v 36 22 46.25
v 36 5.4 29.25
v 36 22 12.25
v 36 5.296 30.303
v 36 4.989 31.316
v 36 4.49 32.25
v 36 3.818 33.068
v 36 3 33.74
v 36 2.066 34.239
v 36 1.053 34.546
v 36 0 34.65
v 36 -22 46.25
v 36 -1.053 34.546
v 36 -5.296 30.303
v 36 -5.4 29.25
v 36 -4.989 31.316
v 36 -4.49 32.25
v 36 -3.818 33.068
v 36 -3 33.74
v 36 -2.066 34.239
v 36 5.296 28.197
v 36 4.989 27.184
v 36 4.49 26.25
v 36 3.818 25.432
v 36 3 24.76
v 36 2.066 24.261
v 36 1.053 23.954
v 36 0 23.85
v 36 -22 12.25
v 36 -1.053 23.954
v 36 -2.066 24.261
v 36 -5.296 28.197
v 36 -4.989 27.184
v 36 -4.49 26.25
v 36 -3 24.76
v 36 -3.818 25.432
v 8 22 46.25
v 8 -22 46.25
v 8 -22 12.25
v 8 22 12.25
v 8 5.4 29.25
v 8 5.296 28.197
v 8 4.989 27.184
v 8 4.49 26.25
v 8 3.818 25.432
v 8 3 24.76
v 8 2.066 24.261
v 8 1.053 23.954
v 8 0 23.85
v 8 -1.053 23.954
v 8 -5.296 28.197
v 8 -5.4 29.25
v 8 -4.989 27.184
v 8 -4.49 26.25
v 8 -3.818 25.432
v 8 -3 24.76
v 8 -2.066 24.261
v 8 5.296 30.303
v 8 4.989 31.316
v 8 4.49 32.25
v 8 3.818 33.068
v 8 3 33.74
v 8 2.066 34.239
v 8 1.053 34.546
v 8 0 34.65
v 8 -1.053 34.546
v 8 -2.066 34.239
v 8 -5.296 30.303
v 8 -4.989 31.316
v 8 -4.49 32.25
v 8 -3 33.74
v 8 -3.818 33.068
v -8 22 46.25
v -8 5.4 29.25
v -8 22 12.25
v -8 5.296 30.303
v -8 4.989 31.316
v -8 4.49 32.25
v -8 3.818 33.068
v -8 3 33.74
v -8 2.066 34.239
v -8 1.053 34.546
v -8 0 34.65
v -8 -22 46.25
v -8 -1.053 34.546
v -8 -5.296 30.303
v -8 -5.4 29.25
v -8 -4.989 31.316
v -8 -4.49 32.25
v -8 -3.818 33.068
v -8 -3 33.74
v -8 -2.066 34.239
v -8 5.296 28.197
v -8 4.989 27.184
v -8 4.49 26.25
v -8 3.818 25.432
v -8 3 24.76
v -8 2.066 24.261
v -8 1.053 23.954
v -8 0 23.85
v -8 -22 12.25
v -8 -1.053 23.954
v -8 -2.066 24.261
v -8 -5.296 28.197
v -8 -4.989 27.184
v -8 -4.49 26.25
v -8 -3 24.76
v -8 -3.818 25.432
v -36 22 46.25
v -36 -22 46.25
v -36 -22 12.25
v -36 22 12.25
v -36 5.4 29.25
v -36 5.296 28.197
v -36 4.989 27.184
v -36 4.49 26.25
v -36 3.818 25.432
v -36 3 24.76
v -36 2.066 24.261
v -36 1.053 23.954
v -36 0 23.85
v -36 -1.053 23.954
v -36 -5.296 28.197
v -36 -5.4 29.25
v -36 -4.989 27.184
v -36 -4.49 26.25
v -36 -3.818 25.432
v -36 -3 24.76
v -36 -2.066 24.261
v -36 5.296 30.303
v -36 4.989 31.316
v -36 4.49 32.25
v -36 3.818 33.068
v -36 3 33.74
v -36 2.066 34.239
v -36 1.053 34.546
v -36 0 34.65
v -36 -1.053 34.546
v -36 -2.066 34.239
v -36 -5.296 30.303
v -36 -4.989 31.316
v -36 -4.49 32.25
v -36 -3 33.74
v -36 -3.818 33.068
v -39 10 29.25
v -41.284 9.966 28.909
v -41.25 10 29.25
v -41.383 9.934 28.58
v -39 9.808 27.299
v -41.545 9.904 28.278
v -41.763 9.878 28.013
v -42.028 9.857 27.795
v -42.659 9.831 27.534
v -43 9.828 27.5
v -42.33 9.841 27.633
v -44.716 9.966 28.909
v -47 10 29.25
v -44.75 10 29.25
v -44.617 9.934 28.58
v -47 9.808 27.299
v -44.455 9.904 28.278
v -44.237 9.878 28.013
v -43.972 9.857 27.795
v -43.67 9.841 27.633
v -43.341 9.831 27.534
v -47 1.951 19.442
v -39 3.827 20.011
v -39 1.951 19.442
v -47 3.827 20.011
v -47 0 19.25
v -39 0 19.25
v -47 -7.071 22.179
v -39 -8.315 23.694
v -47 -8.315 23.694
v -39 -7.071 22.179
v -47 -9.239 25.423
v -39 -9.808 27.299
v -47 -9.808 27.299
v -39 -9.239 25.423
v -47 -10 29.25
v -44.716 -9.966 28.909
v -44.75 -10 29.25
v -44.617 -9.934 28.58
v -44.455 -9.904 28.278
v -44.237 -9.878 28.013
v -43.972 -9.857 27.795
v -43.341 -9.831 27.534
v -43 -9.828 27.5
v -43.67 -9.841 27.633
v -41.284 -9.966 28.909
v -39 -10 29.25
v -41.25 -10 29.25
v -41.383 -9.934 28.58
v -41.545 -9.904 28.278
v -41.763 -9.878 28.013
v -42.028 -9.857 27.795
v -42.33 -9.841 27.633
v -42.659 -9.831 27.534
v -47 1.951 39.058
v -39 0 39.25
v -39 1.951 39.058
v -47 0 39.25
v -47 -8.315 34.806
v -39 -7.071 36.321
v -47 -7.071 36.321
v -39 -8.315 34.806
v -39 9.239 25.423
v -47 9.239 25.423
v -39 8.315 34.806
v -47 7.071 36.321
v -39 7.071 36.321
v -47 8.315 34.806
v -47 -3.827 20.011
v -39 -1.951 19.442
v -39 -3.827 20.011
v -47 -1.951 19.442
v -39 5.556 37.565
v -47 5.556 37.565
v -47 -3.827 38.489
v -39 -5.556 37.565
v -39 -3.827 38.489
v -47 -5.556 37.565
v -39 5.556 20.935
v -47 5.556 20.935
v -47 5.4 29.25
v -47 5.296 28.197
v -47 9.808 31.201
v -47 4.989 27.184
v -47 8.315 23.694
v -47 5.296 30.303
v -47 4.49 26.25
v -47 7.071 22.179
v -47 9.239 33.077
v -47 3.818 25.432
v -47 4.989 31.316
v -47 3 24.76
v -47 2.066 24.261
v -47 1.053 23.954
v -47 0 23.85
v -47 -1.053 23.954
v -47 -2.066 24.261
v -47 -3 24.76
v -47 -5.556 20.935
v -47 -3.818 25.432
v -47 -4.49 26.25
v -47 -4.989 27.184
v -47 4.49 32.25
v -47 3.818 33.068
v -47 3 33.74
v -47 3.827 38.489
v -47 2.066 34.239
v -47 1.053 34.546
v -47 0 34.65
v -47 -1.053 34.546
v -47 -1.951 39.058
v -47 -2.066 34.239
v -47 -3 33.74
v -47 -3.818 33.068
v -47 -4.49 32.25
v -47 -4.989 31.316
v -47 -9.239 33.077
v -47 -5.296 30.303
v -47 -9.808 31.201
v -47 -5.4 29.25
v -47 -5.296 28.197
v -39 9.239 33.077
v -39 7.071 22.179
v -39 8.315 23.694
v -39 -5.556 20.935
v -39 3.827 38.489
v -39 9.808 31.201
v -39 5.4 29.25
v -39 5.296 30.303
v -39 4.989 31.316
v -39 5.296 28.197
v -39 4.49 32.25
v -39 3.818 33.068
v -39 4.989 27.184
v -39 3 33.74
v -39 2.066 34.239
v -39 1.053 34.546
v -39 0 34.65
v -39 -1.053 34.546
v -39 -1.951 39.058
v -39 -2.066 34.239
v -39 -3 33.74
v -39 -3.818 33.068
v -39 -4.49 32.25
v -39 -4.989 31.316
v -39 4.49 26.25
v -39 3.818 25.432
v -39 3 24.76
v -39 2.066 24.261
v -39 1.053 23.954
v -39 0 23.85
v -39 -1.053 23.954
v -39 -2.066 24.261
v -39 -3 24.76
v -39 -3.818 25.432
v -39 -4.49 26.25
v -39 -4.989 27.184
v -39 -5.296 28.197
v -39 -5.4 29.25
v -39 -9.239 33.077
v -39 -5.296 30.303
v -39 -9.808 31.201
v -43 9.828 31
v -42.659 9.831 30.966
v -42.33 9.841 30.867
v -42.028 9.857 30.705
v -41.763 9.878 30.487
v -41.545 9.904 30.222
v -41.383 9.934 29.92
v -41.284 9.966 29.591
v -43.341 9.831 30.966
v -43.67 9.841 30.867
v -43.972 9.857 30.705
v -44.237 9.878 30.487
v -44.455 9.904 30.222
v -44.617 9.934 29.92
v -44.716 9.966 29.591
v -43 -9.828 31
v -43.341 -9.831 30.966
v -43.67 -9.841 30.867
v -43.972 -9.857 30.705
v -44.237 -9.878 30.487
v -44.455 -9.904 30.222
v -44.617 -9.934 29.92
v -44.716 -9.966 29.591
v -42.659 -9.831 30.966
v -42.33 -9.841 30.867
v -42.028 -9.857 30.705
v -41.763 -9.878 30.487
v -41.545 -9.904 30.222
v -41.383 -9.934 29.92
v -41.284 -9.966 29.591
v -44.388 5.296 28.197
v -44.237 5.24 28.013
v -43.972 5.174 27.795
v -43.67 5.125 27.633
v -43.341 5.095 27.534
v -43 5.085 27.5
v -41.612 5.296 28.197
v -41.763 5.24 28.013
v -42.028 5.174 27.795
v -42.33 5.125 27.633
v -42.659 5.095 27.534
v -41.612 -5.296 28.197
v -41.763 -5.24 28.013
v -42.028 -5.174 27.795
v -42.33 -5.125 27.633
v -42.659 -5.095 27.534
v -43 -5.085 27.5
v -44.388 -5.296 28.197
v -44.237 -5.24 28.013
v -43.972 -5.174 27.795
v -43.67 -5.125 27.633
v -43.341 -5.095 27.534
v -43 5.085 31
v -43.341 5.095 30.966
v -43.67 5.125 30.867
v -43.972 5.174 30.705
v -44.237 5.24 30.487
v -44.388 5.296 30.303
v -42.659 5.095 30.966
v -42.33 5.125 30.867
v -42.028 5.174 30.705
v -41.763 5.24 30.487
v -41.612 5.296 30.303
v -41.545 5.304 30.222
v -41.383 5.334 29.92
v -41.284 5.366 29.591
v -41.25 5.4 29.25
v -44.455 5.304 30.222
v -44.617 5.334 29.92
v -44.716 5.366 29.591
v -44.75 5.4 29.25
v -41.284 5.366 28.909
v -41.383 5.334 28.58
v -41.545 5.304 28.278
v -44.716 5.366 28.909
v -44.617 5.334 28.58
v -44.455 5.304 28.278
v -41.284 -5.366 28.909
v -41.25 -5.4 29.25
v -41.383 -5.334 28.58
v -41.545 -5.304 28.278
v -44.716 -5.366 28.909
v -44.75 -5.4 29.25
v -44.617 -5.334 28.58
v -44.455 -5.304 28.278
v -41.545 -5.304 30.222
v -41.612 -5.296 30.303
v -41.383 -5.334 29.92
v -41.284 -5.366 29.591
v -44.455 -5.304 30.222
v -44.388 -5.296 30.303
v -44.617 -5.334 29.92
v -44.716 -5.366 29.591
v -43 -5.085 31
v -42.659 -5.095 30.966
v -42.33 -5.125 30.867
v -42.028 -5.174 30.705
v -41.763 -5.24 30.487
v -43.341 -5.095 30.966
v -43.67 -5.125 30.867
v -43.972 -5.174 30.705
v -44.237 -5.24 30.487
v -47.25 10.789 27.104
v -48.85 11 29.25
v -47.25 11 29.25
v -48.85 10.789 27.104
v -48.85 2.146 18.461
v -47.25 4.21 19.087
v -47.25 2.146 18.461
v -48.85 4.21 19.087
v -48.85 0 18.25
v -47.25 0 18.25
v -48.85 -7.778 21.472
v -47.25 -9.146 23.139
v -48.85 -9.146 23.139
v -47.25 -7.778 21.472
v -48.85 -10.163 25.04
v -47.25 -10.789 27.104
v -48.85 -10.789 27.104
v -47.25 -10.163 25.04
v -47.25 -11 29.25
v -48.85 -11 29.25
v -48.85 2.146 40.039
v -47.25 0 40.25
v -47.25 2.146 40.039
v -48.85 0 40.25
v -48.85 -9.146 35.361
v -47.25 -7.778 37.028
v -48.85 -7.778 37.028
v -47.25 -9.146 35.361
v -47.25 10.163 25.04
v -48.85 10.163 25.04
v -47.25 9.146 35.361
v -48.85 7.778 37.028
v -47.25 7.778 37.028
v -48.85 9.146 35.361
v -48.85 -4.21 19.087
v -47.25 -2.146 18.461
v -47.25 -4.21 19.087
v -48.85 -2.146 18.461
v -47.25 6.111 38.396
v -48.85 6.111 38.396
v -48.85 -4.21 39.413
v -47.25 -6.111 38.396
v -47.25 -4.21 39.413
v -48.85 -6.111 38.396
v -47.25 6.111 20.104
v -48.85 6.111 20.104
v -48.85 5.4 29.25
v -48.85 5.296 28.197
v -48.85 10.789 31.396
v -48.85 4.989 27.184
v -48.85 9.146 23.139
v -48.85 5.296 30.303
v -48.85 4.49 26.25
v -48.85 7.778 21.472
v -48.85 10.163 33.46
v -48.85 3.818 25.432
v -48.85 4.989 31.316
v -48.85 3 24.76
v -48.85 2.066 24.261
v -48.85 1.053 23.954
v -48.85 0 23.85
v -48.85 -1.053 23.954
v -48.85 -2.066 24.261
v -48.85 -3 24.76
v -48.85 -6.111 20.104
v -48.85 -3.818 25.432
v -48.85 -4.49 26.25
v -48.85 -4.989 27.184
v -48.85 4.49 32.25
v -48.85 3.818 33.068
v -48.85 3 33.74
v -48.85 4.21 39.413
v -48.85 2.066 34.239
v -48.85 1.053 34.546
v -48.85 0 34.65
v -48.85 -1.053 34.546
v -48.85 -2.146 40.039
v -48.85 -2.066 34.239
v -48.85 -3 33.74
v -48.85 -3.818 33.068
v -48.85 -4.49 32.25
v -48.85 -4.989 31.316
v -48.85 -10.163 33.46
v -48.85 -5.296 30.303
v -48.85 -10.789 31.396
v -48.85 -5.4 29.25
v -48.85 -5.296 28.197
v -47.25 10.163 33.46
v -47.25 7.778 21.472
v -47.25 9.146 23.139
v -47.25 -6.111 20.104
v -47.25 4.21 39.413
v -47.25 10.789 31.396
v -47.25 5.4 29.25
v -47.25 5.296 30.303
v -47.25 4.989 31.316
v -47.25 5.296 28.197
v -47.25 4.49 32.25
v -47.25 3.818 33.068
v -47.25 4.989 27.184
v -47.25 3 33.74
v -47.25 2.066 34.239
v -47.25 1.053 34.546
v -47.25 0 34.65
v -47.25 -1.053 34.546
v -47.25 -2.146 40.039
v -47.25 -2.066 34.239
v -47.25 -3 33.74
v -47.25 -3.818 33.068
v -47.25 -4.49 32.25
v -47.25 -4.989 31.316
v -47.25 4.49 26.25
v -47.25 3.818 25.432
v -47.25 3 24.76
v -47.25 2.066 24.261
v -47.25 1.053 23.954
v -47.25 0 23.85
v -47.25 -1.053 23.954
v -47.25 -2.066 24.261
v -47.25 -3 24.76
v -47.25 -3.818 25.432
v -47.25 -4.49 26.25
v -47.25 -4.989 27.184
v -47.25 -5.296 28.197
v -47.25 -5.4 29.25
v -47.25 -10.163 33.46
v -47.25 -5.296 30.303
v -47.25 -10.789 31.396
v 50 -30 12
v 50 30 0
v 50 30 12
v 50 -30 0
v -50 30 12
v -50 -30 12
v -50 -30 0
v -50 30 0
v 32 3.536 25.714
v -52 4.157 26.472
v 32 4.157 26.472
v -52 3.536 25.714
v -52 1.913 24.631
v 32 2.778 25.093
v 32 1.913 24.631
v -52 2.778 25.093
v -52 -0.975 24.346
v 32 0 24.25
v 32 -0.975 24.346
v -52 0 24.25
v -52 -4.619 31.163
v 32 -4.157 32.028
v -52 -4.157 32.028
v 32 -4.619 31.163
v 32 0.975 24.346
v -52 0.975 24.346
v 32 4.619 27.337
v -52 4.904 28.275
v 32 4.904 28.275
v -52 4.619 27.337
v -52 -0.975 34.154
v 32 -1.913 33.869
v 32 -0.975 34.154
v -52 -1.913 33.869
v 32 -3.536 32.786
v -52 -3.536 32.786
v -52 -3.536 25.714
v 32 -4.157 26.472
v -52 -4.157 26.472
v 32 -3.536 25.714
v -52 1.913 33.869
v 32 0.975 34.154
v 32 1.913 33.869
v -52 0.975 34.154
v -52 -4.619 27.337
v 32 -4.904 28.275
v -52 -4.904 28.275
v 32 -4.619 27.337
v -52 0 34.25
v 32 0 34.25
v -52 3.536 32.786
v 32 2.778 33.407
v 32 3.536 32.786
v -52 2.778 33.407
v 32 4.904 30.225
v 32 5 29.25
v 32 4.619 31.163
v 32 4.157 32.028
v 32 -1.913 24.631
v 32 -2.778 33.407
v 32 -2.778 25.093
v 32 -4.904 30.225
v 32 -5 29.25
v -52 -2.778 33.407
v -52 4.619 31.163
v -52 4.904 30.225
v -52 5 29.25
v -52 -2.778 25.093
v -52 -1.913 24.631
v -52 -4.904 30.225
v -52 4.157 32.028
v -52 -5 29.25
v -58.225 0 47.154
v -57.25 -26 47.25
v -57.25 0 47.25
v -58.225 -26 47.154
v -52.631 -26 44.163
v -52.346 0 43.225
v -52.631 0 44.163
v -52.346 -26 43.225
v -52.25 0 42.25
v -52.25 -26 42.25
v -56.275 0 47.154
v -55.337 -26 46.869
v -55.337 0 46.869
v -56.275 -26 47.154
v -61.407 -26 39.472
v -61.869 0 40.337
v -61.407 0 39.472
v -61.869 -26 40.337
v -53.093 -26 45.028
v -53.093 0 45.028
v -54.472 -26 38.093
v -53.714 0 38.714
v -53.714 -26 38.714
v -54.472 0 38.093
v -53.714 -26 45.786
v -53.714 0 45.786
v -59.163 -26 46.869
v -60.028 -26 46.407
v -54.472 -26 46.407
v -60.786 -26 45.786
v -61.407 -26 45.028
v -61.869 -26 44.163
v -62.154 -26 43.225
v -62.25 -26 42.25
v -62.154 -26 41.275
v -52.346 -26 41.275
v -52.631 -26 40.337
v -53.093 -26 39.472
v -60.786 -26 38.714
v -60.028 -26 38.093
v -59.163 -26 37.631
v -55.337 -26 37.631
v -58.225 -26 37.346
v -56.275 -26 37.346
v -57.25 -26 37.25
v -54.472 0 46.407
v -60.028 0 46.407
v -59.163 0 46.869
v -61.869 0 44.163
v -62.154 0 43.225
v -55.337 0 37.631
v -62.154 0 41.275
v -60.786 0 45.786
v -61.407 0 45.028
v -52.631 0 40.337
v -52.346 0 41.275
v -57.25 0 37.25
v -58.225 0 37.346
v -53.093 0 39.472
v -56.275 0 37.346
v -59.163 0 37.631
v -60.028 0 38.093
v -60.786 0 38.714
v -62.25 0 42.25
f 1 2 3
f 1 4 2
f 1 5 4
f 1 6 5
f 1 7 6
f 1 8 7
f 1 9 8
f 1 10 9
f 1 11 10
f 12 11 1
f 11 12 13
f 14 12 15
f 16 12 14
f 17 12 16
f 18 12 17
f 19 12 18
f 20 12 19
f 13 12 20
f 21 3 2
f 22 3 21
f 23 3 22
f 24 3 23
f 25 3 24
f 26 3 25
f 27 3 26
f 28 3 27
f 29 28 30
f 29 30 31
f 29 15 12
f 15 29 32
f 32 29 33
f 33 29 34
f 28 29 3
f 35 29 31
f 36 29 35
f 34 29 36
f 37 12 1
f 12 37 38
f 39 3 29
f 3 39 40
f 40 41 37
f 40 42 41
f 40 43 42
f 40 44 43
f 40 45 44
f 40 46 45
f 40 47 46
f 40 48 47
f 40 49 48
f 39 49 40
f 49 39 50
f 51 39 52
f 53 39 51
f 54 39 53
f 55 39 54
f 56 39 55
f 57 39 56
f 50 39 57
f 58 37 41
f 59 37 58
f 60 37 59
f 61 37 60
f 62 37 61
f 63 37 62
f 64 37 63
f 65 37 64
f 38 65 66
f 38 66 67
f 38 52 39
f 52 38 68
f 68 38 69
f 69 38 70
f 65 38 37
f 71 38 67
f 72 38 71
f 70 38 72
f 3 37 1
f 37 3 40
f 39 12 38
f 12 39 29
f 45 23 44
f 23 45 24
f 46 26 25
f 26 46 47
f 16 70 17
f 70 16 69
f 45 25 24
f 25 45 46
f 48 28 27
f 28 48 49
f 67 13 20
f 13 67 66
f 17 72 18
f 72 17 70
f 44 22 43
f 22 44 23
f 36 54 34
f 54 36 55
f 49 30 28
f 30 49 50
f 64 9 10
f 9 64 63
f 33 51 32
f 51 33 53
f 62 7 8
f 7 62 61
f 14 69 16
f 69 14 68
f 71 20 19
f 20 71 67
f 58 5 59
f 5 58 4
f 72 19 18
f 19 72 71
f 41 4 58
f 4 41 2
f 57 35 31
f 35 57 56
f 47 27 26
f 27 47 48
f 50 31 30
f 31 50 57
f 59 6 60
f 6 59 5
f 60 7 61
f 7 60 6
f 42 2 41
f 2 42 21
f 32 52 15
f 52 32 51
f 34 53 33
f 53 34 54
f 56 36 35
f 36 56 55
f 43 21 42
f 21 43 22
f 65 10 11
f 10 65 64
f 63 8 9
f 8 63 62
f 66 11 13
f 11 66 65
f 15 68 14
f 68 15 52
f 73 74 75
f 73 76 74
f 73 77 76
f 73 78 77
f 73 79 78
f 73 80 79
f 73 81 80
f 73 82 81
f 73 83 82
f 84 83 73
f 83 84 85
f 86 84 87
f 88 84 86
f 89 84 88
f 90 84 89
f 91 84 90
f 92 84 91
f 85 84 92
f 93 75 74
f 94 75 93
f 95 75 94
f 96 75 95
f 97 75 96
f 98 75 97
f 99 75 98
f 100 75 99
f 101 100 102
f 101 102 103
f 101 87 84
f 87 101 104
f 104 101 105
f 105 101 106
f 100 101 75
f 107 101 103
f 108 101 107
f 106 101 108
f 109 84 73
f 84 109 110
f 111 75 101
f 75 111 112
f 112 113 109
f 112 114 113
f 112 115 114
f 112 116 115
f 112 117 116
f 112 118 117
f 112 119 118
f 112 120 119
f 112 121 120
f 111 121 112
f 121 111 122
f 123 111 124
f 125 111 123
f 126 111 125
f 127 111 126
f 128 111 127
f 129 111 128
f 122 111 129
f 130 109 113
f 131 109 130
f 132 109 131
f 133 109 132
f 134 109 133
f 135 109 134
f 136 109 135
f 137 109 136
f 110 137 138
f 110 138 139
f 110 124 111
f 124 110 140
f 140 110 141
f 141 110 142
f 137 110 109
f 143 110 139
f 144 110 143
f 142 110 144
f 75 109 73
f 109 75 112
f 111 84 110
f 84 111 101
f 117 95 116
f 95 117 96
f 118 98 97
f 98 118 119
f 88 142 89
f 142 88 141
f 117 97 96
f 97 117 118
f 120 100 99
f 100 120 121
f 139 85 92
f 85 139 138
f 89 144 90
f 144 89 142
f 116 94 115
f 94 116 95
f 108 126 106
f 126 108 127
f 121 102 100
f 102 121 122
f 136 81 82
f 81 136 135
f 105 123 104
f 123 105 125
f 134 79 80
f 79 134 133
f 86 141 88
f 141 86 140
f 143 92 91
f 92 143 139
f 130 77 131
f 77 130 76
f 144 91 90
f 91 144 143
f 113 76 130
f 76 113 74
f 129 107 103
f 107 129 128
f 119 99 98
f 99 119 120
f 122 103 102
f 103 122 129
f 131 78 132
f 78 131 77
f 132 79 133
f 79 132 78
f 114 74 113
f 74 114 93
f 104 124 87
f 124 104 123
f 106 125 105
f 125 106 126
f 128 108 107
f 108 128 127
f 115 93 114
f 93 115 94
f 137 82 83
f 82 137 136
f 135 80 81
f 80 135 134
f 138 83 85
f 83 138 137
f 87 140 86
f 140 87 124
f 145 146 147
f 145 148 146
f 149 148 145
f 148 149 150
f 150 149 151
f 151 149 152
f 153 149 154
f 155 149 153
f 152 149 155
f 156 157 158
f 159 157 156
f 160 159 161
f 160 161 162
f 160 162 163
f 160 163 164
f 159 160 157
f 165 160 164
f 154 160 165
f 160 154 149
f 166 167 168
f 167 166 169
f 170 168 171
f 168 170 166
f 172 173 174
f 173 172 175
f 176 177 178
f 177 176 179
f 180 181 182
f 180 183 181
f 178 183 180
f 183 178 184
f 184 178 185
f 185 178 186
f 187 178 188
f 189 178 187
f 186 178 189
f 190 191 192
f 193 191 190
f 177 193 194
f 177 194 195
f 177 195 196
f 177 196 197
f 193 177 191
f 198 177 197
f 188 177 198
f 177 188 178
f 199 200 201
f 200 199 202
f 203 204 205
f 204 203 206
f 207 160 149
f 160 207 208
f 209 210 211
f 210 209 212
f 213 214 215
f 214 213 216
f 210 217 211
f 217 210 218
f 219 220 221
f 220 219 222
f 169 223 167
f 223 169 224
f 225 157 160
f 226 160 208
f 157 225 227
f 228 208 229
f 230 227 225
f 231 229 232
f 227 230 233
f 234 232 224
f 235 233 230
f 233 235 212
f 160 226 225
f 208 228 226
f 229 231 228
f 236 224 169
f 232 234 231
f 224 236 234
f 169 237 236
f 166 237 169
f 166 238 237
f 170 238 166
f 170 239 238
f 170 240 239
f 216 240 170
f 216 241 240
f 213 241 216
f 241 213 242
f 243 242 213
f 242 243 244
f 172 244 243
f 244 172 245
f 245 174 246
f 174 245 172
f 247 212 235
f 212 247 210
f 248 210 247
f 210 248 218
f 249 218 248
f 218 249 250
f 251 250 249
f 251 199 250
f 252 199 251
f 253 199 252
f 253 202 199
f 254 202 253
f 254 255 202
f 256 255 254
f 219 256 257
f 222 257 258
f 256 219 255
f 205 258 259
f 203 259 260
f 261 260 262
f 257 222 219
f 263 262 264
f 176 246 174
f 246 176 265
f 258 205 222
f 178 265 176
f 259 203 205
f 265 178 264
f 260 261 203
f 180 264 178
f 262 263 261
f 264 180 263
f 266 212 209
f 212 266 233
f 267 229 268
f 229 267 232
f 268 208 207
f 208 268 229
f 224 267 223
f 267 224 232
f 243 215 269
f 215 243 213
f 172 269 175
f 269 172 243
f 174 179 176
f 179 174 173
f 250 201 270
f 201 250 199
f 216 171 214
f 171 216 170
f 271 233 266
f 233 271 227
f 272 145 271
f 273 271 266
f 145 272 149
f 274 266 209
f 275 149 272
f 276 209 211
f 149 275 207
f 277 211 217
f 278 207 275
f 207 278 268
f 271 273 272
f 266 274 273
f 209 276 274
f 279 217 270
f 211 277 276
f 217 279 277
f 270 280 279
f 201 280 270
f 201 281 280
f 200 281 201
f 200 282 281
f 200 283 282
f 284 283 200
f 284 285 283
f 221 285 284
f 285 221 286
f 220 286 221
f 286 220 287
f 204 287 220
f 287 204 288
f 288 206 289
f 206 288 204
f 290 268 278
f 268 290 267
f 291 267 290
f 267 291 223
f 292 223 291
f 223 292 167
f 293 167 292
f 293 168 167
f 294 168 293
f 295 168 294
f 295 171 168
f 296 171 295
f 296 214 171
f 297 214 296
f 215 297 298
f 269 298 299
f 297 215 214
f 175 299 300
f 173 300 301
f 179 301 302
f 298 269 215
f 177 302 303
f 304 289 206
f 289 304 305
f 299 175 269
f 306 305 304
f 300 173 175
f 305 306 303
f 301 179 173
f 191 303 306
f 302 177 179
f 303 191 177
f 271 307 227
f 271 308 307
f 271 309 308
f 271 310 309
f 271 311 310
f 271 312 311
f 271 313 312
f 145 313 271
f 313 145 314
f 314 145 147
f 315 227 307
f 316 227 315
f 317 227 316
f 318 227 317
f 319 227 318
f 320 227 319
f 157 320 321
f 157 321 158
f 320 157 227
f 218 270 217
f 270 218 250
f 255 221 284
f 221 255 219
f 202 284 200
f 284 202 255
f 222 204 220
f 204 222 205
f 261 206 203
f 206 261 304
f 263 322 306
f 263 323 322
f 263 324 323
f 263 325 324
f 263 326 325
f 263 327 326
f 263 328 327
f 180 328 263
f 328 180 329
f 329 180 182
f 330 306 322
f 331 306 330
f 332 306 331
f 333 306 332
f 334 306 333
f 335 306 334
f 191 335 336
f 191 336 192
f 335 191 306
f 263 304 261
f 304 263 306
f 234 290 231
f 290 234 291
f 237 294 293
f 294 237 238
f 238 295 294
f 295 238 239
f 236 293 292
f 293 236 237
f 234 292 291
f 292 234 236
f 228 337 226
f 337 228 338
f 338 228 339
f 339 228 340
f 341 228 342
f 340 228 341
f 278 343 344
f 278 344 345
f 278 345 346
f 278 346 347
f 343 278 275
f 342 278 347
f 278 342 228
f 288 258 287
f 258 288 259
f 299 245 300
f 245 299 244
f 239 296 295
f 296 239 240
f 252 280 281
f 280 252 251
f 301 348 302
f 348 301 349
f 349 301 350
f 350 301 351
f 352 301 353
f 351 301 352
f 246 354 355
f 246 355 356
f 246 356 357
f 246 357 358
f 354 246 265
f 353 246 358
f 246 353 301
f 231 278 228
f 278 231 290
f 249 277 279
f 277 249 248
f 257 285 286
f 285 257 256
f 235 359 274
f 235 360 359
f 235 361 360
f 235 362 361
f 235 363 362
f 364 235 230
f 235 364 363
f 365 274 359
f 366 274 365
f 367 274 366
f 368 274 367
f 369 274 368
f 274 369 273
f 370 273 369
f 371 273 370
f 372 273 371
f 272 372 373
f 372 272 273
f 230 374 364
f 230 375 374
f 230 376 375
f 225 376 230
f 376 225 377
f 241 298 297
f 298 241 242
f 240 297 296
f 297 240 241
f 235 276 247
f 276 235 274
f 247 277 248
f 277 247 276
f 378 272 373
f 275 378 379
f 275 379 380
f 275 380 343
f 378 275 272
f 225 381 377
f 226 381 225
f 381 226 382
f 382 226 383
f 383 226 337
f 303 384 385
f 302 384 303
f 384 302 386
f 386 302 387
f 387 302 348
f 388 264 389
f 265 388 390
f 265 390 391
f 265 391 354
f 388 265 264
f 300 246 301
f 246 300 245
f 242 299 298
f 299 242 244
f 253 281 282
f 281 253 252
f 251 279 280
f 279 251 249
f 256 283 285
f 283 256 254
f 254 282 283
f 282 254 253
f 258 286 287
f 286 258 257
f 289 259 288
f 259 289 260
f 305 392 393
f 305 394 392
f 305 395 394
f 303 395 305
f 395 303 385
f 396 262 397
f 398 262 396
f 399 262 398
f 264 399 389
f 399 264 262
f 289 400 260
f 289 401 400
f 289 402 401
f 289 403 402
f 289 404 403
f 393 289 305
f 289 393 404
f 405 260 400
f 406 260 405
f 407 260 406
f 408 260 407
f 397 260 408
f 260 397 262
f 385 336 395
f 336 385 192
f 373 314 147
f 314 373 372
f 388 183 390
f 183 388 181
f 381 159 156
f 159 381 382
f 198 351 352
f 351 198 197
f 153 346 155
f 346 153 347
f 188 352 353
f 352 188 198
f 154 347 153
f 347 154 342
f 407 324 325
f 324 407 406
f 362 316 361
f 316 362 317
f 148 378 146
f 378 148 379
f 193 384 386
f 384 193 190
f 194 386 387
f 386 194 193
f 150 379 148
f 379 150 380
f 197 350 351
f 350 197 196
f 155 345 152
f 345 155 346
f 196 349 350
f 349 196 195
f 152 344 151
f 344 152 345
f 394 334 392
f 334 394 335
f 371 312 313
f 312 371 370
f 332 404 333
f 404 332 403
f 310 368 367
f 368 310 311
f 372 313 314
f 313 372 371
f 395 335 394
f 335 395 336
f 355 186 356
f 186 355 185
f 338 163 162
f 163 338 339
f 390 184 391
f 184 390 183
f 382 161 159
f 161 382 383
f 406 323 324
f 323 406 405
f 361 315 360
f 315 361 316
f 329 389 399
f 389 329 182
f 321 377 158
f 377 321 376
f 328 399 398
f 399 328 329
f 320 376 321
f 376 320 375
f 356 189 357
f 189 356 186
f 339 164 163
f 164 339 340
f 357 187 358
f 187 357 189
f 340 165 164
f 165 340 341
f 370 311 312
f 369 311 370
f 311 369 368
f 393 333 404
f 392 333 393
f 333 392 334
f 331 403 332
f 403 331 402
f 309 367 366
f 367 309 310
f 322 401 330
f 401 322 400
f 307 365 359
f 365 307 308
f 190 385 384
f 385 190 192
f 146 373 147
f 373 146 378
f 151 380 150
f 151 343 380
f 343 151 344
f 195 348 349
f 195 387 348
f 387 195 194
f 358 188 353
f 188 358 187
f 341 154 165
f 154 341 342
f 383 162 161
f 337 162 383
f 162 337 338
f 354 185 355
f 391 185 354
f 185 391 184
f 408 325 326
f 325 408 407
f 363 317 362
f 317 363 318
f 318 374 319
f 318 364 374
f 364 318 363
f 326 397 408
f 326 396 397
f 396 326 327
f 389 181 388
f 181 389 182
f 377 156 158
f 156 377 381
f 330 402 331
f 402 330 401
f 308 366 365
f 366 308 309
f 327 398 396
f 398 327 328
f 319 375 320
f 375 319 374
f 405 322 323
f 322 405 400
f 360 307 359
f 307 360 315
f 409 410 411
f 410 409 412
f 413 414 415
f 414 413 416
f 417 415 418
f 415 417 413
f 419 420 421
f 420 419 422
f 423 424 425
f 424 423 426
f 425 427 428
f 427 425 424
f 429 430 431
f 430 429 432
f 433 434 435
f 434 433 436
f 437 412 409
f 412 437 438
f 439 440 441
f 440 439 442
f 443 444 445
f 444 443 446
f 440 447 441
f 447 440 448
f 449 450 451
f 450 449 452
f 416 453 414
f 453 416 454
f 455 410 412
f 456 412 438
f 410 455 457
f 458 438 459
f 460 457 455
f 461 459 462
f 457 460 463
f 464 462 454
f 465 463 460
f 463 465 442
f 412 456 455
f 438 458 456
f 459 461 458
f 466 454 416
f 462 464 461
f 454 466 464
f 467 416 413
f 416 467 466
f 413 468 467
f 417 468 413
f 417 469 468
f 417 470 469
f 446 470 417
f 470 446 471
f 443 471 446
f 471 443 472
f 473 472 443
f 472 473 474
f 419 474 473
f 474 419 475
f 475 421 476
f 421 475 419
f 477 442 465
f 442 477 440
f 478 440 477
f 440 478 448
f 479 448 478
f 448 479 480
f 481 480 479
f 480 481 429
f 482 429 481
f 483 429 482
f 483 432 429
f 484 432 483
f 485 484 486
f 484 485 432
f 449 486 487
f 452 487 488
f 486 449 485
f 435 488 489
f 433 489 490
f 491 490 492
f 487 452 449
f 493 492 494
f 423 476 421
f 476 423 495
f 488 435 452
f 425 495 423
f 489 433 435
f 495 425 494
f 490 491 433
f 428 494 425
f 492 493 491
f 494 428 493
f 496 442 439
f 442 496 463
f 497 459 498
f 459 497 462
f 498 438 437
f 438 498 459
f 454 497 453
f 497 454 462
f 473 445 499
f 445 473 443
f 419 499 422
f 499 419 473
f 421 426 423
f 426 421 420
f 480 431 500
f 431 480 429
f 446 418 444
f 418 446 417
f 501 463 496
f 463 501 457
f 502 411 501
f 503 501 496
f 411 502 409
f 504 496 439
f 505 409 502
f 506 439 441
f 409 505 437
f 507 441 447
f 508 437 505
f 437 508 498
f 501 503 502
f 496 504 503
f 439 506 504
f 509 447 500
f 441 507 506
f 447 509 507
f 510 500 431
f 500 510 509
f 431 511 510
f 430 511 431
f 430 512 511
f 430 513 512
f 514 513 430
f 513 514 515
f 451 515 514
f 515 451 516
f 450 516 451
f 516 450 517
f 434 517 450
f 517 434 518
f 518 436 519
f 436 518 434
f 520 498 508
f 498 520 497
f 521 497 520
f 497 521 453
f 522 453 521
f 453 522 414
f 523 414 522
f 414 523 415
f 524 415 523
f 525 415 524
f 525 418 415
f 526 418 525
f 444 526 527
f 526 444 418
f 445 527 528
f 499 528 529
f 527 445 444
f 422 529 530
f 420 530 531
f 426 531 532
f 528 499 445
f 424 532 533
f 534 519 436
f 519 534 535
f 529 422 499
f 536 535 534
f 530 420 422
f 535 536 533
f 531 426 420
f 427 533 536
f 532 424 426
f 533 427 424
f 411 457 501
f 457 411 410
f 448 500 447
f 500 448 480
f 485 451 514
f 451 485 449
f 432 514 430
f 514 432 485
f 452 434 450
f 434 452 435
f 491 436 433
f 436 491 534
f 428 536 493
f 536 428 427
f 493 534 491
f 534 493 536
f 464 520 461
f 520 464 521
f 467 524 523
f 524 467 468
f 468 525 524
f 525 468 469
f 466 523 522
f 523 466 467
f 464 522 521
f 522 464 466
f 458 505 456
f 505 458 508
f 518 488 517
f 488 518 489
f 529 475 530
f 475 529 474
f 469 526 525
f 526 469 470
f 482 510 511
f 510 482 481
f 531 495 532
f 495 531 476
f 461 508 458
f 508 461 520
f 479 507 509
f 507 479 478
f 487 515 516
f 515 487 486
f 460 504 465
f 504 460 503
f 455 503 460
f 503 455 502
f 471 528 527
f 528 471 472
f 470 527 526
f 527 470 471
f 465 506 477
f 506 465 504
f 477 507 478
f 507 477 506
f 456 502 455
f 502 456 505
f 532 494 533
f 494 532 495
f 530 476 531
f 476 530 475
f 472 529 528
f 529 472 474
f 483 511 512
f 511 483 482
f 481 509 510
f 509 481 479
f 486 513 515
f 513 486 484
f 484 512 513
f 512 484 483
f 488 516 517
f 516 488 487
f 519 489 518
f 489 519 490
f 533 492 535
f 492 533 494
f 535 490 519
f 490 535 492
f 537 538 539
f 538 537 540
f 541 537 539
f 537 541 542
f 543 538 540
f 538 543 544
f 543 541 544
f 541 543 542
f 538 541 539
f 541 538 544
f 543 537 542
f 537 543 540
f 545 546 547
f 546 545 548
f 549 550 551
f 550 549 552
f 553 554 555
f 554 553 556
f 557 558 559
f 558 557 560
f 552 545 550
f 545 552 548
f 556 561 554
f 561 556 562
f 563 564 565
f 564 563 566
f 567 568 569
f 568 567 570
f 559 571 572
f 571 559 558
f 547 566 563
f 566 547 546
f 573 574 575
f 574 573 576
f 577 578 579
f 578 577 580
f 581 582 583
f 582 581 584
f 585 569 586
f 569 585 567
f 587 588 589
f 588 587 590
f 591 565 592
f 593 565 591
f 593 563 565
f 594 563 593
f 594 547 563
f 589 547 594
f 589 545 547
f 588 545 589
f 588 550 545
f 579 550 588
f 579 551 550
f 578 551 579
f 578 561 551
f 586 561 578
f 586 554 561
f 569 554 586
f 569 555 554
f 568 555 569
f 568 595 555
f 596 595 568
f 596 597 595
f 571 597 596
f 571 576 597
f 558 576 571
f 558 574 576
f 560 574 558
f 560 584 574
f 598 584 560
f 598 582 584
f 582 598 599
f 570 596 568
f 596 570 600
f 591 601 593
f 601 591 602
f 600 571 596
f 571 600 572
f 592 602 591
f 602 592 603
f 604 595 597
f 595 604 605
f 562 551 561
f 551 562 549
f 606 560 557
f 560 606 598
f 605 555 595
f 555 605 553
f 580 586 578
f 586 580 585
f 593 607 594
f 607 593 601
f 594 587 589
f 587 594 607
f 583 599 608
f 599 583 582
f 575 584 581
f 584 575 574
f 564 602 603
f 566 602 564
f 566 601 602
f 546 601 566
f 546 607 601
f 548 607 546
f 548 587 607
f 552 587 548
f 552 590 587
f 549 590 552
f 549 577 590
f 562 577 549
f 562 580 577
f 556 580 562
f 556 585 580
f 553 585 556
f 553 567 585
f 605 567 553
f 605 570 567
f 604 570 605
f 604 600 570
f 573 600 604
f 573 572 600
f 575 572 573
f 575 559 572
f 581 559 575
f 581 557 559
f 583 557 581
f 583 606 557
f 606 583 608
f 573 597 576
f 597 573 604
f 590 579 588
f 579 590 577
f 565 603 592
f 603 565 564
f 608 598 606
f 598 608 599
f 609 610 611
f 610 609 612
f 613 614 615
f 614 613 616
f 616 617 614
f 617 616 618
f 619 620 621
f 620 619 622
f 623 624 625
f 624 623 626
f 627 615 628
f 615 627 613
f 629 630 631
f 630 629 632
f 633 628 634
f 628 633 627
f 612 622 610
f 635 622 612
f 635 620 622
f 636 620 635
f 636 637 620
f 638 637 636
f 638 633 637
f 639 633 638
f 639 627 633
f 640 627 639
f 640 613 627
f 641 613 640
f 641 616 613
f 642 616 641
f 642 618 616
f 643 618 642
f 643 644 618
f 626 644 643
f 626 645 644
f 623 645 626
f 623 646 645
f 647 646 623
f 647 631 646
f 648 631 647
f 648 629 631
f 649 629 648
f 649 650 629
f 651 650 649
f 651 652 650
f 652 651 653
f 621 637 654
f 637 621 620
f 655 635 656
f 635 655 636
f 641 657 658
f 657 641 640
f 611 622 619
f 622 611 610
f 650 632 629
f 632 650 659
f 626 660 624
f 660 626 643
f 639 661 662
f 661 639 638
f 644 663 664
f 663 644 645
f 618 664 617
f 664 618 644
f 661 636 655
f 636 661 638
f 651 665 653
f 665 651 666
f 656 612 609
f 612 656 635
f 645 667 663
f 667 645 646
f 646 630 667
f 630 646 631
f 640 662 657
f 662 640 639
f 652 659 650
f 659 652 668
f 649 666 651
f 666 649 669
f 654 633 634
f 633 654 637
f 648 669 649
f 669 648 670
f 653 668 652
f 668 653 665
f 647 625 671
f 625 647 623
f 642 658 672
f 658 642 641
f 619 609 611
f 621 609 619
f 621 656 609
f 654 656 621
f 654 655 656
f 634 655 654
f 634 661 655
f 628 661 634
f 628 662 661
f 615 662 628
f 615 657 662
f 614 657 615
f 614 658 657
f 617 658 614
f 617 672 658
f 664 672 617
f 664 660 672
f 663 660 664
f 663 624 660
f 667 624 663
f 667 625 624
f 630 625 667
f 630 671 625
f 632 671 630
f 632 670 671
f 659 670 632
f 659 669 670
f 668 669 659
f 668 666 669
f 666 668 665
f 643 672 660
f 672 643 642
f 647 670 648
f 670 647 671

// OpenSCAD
$fn = 32;

// ------------------------------------------------------------------------
// Machine vise: screw d10, jaws 28 x 34 mm
// Every part is its own module, assembly() places every instance.
// ------------------------------------------------------------------------

// --- part 1 ---
module vise_bed() {
  difference() {
    translate([-50, -30, 0]) cube([100, 60, 12]);
  }
}

// --- part 2 ---
module vise_jaw() {
  difference() {
    translate([-14, -22, 0]) cube([28, 44, 34]);
    translate([0, 0, 17]) rotate([0, 90, 0]) cylinder(h = 30, d = 10.8, center = true);
  }
}

// --- part 3 ---
module vise_screw() {
  translate([0, 0, -42]) cylinder(h = 84, d = 10);
}

// --- part 4 ---
module screw_collar() {
  difference() {
    cylinder(h = 8, d = 20);
    translate([0, 0, -1]) cylinder(h = 10, d = 10.8);
    translate([0, 0, 4]) rotate([90, 0, 0]) cylinder(h = 22, d = 3.5, center = true);
  }
}

// --- part 5 ---
module screw_washer() {
  difference() {
      translate([0, 0, 0]) cylinder(h = 1.6, d = 22);
      translate([0, 0, -1]) cylinder(h = 3.6, d = 10.8);
    }
}

// --- part 6 ---
module vise_handle() {
  cylinder(h = 26, d = 10);
}

// --- assembly ---
module assembly() {
  color([0.80, 0.24, 0.20]) translate([0, 0, 0]) rotate([0, 0, 0]) vise_bed();
  color([0.20, 0.45, 0.75]) translate([22, 0, 12.25]) rotate([0, 0, 0]) vise_jaw();
  color([0.25, 0.62, 0.32]) translate([-22, 0, 12.25]) rotate([0, 0, 0]) vise_jaw();
  color([0.92, 0.70, 0.18]) translate([-10, 0, 29.25]) rotate([0, 90, 0]) vise_screw();
  color([0.58, 0.35, 0.70]) translate([-47, 0, 29.25]) rotate([0, 90, 0]) screw_collar();
  color([0.16, 0.66, 0.66]) translate([-48.85, 0, 29.25]) rotate([0, 90, 0]) screw_washer();
  color([0.85, 0.48, 0.18]) translate([-57.25, 0, 42.25]) rotate([90, 0, 0]) vise_handle();
}

assembly();
